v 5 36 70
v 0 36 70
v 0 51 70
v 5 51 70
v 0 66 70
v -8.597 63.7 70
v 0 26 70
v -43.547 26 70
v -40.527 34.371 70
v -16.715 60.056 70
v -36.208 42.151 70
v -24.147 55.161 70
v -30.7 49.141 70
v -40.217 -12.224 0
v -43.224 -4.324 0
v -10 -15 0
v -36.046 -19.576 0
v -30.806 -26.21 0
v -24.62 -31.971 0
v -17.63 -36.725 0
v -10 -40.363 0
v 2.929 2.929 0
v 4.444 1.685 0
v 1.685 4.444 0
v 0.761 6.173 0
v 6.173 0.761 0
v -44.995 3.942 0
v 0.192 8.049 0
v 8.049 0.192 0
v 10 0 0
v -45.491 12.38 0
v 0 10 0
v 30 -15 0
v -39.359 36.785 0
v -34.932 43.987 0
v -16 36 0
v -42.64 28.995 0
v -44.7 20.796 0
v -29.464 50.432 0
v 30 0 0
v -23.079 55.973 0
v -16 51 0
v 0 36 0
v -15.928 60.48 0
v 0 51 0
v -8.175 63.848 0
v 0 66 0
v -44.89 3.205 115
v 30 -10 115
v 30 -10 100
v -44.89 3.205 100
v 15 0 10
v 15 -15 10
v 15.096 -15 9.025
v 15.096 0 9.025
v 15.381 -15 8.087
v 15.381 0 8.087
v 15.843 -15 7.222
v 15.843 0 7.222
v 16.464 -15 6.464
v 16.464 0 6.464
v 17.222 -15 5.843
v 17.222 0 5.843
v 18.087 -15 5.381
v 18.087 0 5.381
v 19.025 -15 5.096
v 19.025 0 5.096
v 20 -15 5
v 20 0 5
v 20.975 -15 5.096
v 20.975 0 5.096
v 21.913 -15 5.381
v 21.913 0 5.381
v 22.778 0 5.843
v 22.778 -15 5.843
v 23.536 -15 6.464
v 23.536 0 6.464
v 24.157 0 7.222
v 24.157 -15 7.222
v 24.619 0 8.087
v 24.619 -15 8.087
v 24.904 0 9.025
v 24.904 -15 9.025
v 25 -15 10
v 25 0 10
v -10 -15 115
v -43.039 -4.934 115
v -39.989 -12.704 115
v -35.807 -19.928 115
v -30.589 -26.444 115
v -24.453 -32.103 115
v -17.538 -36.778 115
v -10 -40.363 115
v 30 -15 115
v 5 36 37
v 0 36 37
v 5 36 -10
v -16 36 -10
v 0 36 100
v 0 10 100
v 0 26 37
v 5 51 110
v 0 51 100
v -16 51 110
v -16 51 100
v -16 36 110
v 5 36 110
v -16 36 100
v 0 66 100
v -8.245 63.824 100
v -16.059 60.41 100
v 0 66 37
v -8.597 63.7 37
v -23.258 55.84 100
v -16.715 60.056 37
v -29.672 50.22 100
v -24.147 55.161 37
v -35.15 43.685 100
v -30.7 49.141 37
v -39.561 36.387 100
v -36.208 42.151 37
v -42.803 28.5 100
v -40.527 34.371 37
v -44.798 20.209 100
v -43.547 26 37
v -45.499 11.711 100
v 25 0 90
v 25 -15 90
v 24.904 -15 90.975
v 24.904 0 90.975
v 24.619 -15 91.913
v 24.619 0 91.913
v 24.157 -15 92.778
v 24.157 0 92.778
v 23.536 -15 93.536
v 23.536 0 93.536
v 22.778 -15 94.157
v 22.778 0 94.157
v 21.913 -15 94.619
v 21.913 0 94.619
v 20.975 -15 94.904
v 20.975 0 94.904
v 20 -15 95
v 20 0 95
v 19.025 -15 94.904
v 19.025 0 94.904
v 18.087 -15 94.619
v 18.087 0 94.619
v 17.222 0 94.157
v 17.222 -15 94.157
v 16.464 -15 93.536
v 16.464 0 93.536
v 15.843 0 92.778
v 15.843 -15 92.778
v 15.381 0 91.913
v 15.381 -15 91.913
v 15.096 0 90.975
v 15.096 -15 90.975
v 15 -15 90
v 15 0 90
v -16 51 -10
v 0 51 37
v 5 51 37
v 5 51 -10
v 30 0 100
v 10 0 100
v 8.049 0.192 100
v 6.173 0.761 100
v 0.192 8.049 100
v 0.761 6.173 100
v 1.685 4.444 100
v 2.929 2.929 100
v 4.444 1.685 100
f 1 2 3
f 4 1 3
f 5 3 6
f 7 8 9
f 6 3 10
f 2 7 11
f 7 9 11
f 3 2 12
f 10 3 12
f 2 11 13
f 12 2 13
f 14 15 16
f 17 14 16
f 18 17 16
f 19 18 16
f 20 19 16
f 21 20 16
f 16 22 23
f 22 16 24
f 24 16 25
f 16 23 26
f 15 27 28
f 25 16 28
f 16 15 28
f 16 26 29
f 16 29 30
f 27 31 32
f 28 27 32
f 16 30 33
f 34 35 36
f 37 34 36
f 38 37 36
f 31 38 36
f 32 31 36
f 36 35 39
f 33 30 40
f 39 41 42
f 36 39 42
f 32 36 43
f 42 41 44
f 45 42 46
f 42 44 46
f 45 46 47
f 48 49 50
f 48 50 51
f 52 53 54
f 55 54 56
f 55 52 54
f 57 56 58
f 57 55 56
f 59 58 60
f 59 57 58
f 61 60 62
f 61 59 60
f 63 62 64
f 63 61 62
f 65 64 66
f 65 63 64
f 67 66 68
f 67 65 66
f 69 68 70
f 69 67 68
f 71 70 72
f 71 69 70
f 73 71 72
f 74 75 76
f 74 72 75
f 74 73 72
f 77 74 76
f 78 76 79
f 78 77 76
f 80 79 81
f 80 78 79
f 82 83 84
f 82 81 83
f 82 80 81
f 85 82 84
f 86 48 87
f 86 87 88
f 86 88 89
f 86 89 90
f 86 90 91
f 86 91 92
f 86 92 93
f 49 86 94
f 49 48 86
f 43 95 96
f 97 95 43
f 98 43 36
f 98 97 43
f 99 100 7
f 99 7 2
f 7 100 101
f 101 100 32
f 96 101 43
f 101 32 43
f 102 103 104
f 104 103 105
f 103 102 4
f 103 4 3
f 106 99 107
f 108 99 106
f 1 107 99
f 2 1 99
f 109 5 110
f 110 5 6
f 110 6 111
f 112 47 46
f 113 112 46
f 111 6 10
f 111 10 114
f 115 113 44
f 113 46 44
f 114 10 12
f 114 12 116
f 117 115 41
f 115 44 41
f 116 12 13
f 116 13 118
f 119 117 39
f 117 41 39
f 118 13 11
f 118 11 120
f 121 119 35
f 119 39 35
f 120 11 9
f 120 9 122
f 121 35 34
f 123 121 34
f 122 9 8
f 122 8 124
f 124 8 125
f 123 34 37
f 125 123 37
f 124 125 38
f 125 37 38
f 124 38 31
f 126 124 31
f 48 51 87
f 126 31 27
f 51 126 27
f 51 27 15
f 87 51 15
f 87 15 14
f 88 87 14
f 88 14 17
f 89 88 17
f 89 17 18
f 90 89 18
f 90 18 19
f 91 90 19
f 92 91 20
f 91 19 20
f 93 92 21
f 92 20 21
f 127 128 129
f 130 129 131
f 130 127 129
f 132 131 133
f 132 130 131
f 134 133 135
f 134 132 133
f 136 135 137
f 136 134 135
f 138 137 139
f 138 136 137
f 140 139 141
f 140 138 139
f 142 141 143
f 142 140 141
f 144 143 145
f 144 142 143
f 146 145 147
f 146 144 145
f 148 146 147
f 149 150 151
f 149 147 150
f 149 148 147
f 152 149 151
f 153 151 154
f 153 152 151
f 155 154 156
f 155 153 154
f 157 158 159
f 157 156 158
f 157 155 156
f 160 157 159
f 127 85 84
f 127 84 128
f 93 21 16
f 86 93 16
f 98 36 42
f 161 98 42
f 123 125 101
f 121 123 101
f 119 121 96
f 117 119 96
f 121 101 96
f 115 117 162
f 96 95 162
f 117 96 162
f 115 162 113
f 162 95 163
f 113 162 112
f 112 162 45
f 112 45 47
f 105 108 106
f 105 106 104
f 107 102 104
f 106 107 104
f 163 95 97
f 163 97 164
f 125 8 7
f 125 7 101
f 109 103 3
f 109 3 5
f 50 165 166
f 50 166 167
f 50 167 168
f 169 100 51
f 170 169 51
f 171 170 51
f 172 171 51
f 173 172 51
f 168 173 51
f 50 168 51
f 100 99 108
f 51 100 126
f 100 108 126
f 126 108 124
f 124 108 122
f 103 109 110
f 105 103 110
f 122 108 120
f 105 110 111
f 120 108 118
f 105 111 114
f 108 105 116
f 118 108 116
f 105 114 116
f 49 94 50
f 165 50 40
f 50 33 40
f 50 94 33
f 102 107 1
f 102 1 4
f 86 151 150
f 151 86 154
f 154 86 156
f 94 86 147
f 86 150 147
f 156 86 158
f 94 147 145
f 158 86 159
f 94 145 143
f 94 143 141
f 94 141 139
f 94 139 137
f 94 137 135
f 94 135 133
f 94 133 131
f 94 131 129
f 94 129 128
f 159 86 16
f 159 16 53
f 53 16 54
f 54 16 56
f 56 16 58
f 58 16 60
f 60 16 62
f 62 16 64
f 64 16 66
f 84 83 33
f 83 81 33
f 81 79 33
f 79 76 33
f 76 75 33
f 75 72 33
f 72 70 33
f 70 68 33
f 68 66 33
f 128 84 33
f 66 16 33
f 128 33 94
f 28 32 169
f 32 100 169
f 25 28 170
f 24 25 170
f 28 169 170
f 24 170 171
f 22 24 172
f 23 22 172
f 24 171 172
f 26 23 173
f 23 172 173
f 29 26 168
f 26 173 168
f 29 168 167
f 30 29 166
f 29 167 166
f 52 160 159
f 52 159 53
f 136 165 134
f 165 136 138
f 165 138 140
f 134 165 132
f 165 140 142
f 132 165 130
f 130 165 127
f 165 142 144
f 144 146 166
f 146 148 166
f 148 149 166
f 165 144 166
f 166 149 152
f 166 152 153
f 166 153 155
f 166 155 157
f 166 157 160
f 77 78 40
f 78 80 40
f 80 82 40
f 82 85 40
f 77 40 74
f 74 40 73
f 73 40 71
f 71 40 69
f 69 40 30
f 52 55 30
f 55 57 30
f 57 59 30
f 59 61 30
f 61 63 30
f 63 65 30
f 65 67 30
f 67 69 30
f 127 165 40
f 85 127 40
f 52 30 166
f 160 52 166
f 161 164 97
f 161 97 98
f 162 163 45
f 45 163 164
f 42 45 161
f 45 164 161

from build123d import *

# Parameters (mm, degrees)
BOSS_EXTRUDE1_DEPTH      = 115
CUT_EXTRUDE1_DEPTH       = 15
SKETCH3_W                = 21
SKETCH3_H                = 15
BOSS_EXTRUDE2_DEPTH      = 10
BOSS_EXTRUDE2_DEPTH_BACK = 110
SKETCH4_W                = 33
SKETCH4_H                = 40
CUT_EXTRUDE2_DEPTH       = 31
CUT_EXTRUDE2_DEPTH_BACK  = 46.5
CUT_EXTRUDE3_DEPTH       = 67
CUT_EXTRUDE3_DEPTH_BACK  = 41.362796982
FILLET1_R                = 10


with BuildPart() as part:
    # Sketch1 → Boss-Extrude1 (new body)
    with BuildSketch(Plane.XY):
        with BuildLine():
            Line((0, 0), (0, 66))
            ThreePointArc((0, 66), (-45.256322222, 16.603413808), (-10, -40.362796982))
            Line((-10, -40.362796982), (-10, -15))
            Line((-10, -15), (30, -15))
            Line((30, -15), (30, 0))
            Line((30, 0), (0, 0))
        make_face()
    extrude(amount=BOSS_EXTRUDE1_DEPTH)

    # Sketch2 → Cut-Extrude1 (cut)
    with BuildSketch(Plane.XY.offset(115)):
        with BuildLine():
            Line((30, -10), (-44.890423857, 3.205202323))
            ThreePointArc((-44.890423857, 3.205202323), (-35.149622711, 43.684665376), (0, 66))
            Line((0, 66), (0, 0))
            Line((0, 0), (30, 0))
            Line((30, 0), (30, -10))
        make_face()
    extrude(amount=-CUT_EXTRUDE1_DEPTH, mode=Mode.SUBTRACT)

    # Sketch3 → Boss-Extrude2 (add, two sides)
    with BuildSketch(Plane(origin=(0, 0, 0), x_dir=(-1, 0, 0), z_dir=(0, 0, -1))) as boss_extrude2_sk:
        with Locations((5.5, 43.5)):
            Rectangle(SKETCH3_W, SKETCH3_H)
    extrude(amount=BOSS_EXTRUDE2_DEPTH)
    extrude(boss_extrude2_sk.sketch, amount=-BOSS_EXTRUDE2_DEPTH_BACK)

    # Sketch4 → Cut-Extrude2 (cut, two sides)
    with BuildSketch(Plane(origin=(0, 0, 0), x_dir=(0, 0, -1), z_dir=(1, 0, 0))) as cut_extrude2_sk:
        with Locations((-53.5, 46)):
            Rectangle(SKETCH4_W, SKETCH4_H)
    extrude(amount=CUT_EXTRUDE2_DEPTH, mode=Mode.SUBTRACT)
    extrude(cut_extrude2_sk.sketch, amount=-CUT_EXTRUDE2_DEPTH_BACK, mode=Mode.SUBTRACT)

    # Sketch5 → Cut-Extrude3 (cut, two sides)
    with BuildSketch(Plane(origin=(0, 0, 0), x_dir=(1, 0, 0), z_dir=(0, 1, 0))) as cut_extrude3_sk:
        with BuildLine():
            Line((25, -10), (25, -90))
            ThreePointArc((25, -90), (20, -95), (15, -90))
            Line((15, -90), (15, -10))
            ThreePointArc((15, -10), (20, -5), (25, -10))
        make_face()
    extrude(amount=CUT_EXTRUDE3_DEPTH, mode=Mode.SUBTRACT)
    extrude(cut_extrude3_sk.sketch, amount=-CUT_EXTRUDE3_DEPTH_BACK, mode=Mode.SUBTRACT)

    # Fillet1
    fillet1_edges = [part.edges().sort_by_distance(p)[0] for p in [
        (0, 0, 50),
    ]]
    fillet(fillet1_edges, radius=FILLET1_R)


solid = part.part
